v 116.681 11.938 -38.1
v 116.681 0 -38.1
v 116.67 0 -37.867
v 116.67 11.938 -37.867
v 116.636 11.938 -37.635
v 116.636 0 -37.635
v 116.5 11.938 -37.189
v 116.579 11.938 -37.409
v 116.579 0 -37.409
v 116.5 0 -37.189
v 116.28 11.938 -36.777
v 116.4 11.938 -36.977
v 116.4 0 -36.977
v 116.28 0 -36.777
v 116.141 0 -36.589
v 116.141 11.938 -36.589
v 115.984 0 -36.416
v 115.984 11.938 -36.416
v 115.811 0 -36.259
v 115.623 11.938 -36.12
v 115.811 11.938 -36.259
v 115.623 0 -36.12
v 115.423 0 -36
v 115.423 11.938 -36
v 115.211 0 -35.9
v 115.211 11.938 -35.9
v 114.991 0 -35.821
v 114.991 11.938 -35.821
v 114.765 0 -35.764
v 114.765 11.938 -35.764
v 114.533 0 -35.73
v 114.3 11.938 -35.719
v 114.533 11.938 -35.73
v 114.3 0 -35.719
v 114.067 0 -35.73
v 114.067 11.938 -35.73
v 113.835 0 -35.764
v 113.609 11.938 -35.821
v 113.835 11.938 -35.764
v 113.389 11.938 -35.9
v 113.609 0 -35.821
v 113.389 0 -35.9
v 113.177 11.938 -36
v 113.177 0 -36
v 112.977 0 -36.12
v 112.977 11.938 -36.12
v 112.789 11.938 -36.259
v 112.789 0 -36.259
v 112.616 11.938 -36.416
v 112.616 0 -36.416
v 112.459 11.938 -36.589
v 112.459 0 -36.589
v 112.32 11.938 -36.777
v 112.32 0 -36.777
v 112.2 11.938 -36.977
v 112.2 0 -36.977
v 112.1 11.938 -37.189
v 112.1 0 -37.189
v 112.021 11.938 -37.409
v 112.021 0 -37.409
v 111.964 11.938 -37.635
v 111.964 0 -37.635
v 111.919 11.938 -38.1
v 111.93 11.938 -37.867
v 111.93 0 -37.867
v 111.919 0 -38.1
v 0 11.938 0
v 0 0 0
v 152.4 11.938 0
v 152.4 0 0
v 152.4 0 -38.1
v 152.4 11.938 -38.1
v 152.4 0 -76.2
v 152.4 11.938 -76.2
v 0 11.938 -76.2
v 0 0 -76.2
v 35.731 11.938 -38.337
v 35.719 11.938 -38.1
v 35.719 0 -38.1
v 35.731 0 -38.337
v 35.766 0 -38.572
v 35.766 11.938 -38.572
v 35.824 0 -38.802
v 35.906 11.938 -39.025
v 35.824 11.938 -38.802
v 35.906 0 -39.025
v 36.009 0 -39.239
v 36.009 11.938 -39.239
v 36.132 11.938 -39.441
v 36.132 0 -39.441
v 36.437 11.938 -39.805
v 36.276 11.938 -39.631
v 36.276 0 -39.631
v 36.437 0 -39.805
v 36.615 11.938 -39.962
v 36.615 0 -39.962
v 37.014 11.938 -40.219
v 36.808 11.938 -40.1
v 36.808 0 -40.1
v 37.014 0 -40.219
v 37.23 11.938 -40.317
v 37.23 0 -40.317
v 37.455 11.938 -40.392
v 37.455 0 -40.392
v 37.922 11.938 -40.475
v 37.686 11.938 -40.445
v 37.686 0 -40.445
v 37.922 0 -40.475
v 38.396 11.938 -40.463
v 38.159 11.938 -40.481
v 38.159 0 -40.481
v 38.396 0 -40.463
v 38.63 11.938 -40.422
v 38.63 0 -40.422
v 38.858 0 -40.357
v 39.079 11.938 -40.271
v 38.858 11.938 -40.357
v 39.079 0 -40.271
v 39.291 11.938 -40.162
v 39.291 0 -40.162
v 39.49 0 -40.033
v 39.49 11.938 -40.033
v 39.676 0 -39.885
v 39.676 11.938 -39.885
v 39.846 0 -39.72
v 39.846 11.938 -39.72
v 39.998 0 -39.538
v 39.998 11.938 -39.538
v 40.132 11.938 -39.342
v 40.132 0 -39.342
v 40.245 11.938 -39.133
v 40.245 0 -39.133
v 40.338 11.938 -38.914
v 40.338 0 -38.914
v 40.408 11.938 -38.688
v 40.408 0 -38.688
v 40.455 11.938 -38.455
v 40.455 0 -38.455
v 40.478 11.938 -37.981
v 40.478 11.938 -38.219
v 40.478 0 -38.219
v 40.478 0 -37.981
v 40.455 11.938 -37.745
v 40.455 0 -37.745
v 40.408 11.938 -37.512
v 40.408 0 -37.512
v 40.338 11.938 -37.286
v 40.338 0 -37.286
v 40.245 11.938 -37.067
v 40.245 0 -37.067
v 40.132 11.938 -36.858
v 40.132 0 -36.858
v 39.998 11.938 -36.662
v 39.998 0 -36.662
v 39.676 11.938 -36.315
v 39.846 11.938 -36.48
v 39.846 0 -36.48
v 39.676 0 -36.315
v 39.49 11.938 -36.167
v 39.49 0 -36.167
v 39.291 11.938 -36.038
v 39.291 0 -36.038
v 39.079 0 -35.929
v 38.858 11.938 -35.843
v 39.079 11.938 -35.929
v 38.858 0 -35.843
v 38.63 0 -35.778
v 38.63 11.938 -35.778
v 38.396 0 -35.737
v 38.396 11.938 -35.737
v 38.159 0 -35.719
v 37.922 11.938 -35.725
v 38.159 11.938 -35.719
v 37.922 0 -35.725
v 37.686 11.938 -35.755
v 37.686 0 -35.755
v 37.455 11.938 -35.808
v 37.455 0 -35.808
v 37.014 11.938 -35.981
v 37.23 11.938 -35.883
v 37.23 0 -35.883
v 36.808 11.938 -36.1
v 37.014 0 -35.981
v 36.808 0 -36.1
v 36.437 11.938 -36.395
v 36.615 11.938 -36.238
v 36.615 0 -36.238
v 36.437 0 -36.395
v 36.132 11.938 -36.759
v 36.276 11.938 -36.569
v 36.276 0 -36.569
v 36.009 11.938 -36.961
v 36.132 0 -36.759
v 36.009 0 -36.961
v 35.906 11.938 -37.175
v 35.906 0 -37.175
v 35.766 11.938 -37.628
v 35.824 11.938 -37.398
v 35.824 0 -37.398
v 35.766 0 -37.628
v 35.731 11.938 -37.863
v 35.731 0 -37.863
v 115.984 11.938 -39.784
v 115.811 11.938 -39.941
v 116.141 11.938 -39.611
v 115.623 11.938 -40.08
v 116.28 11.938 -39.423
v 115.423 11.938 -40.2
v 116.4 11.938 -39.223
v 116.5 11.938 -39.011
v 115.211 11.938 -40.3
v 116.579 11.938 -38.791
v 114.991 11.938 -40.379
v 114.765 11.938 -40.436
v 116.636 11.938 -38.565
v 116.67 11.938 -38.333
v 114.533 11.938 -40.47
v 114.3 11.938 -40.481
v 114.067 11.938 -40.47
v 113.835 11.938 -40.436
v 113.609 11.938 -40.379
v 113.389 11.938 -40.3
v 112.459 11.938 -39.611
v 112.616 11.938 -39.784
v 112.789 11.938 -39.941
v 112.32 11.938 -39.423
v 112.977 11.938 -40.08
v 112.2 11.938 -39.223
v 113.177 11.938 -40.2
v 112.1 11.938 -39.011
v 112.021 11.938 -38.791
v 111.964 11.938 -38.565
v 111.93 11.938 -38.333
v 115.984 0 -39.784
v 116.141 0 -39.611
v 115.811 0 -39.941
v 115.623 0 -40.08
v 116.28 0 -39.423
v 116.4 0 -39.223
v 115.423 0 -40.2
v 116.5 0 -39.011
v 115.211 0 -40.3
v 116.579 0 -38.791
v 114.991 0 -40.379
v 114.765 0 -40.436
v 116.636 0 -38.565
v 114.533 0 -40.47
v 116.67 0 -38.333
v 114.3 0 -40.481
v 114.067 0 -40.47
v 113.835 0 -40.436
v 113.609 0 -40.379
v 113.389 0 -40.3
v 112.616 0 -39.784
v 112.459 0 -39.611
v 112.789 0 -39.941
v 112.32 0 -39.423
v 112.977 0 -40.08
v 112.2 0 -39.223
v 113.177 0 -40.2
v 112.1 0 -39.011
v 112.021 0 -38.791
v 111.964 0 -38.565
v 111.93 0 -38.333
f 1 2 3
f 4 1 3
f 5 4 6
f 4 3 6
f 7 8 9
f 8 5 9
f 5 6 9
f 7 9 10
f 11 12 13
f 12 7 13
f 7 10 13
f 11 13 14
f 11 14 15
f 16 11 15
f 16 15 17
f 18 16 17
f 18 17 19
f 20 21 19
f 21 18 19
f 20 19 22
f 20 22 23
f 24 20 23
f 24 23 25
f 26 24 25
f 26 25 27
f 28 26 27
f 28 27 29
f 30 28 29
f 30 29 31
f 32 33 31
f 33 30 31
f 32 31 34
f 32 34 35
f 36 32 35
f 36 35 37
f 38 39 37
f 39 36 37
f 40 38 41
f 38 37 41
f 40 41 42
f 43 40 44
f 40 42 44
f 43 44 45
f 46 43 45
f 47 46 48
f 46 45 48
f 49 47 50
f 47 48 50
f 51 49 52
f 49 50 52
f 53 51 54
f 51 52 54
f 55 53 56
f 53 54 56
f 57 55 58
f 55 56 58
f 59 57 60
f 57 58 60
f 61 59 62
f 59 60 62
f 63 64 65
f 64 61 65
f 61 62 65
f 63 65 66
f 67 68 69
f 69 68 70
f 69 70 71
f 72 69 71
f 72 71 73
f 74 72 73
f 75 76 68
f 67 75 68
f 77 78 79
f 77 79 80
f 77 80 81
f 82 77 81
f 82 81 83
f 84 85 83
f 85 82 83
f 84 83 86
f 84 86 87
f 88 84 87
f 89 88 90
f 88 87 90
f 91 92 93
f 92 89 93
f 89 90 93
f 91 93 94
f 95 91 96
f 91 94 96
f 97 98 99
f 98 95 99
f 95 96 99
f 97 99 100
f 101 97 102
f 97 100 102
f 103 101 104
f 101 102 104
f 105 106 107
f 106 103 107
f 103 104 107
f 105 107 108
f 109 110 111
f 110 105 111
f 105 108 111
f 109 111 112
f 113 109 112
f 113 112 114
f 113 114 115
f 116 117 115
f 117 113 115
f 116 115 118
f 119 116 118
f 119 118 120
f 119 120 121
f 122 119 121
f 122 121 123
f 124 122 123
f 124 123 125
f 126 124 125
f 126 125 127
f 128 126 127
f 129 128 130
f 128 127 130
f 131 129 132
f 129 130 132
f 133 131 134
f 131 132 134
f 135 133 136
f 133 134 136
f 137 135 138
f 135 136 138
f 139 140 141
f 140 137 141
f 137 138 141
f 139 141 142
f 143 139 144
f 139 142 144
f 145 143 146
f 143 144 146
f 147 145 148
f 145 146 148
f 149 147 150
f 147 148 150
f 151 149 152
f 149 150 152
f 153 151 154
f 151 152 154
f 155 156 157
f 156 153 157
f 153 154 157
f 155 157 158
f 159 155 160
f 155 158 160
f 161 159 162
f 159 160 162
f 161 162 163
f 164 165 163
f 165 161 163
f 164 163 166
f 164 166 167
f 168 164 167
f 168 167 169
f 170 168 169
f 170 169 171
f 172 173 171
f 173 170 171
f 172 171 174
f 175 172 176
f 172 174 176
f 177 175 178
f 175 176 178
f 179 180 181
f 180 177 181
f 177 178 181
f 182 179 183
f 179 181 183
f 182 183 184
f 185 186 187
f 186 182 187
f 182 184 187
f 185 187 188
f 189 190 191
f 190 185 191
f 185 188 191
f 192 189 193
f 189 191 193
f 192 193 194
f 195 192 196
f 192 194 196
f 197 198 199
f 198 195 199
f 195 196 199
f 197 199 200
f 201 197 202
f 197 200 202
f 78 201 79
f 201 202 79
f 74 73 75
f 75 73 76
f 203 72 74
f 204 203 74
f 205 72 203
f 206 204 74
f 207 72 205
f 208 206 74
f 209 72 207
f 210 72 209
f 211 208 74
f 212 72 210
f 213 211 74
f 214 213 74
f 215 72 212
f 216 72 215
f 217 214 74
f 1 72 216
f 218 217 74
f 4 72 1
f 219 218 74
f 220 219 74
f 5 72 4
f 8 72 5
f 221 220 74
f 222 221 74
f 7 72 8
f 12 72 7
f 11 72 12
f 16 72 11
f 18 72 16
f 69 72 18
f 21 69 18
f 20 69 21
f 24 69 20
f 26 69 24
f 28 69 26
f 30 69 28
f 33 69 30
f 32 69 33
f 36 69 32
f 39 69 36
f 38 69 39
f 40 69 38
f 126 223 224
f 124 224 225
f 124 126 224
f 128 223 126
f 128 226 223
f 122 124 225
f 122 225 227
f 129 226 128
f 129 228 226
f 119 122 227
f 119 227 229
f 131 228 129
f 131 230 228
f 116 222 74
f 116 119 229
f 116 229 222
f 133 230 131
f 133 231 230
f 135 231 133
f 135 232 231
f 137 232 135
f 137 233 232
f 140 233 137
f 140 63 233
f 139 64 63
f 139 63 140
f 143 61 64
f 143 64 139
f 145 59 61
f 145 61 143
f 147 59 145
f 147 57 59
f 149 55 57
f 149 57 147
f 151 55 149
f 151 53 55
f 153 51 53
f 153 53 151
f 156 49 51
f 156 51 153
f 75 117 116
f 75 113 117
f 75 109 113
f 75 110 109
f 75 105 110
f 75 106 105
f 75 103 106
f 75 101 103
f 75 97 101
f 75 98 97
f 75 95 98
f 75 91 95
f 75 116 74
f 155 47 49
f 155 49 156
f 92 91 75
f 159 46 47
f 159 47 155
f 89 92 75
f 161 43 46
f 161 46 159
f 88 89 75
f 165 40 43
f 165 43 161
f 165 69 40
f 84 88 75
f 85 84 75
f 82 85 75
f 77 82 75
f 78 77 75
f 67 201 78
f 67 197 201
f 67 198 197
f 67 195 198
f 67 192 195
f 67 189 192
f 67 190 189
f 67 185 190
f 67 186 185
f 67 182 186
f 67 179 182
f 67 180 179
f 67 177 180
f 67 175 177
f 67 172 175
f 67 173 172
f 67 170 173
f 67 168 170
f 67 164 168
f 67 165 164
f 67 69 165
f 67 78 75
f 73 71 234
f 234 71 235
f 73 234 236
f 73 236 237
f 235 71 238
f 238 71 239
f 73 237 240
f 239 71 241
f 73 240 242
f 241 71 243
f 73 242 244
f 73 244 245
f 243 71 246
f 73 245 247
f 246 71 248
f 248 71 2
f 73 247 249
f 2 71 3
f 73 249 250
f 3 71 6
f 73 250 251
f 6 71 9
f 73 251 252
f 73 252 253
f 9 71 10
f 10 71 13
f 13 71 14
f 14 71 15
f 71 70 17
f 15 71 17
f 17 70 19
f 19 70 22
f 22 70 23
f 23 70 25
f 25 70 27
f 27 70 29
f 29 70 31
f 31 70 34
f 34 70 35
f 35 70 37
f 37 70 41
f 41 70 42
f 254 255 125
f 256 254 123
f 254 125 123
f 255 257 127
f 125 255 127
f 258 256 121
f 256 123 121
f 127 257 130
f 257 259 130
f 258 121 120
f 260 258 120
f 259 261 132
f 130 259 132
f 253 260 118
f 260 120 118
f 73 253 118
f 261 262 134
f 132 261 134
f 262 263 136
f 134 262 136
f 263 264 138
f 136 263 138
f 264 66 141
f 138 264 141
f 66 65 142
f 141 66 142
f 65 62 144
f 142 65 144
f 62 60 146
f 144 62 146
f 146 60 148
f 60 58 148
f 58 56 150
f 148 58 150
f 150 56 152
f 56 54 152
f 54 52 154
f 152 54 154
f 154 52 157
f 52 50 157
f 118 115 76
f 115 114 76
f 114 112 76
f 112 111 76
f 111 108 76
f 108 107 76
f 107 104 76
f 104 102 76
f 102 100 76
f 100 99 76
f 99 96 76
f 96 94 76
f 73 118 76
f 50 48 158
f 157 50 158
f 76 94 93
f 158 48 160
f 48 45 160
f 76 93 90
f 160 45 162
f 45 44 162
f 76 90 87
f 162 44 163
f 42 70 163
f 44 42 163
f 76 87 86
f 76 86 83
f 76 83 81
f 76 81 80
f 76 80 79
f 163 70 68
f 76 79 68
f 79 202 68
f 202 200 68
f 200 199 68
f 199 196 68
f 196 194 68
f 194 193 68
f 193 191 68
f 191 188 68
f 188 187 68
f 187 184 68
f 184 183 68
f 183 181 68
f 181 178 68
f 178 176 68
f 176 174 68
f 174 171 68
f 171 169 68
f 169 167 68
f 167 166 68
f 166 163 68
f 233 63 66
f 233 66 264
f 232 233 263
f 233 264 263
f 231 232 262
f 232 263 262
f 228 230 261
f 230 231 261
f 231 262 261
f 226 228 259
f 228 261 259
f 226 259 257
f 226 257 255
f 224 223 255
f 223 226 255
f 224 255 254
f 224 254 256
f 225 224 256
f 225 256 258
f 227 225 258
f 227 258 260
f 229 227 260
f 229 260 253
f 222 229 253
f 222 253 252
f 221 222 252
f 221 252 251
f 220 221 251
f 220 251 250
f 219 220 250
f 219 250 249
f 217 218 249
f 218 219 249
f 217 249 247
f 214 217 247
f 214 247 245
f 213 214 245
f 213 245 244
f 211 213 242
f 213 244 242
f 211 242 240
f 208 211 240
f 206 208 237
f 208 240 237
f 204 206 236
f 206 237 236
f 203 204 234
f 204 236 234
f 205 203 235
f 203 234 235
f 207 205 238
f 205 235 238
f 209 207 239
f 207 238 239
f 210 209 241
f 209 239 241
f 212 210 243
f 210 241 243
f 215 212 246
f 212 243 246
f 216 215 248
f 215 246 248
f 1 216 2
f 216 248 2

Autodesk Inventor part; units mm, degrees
ref_plane "YZ Plane" through (0, 0, 0) normal (1, 0, 0) x (0, 1, 0)
ref_plane "XZ Plane" through (0, 0, 0) normal (0, 1, 0) x (-1, 0, 0)
ref_plane "XY Plane" through (0, 0, 0) normal (0, 0, 1) x (1, 0, 0)
sketch "Sketch1" plane through (0, 0, 0) normal (0, 1, 0) x (-1, 0, 0)
  line L0 (0, 0) -> (-152.4, 0)
  line L1 (-152.4, 0) -> (-152.4, -76.2)
  line L2 (-152.4, -76.2) -> (0, -76.2)
  line L3 (0, -76.2) -> (0, 0)
  line L4 (-152.4, -38.1) -> (0, -38.1) construction
  line L5 (-152.4, -38.1) -> (-114.3, -38.1)
  circle A0 centre (-114.3, -38.1) radius 2.3813
  line L6 (-76.2, 0) -> (-76.2, -76.2) construction
  circle A1 centre (-38.1, -38.1) radius 2.3813
  dimension "d0" = 152.4
  dimension "d1" = 76.2
  dimension "d10" = 38.1
  dimension "d11" = 4.7625
extrude "Extrusion1" add sketch "Sketch1" along normal blind 11.938
properties part number "flat"
